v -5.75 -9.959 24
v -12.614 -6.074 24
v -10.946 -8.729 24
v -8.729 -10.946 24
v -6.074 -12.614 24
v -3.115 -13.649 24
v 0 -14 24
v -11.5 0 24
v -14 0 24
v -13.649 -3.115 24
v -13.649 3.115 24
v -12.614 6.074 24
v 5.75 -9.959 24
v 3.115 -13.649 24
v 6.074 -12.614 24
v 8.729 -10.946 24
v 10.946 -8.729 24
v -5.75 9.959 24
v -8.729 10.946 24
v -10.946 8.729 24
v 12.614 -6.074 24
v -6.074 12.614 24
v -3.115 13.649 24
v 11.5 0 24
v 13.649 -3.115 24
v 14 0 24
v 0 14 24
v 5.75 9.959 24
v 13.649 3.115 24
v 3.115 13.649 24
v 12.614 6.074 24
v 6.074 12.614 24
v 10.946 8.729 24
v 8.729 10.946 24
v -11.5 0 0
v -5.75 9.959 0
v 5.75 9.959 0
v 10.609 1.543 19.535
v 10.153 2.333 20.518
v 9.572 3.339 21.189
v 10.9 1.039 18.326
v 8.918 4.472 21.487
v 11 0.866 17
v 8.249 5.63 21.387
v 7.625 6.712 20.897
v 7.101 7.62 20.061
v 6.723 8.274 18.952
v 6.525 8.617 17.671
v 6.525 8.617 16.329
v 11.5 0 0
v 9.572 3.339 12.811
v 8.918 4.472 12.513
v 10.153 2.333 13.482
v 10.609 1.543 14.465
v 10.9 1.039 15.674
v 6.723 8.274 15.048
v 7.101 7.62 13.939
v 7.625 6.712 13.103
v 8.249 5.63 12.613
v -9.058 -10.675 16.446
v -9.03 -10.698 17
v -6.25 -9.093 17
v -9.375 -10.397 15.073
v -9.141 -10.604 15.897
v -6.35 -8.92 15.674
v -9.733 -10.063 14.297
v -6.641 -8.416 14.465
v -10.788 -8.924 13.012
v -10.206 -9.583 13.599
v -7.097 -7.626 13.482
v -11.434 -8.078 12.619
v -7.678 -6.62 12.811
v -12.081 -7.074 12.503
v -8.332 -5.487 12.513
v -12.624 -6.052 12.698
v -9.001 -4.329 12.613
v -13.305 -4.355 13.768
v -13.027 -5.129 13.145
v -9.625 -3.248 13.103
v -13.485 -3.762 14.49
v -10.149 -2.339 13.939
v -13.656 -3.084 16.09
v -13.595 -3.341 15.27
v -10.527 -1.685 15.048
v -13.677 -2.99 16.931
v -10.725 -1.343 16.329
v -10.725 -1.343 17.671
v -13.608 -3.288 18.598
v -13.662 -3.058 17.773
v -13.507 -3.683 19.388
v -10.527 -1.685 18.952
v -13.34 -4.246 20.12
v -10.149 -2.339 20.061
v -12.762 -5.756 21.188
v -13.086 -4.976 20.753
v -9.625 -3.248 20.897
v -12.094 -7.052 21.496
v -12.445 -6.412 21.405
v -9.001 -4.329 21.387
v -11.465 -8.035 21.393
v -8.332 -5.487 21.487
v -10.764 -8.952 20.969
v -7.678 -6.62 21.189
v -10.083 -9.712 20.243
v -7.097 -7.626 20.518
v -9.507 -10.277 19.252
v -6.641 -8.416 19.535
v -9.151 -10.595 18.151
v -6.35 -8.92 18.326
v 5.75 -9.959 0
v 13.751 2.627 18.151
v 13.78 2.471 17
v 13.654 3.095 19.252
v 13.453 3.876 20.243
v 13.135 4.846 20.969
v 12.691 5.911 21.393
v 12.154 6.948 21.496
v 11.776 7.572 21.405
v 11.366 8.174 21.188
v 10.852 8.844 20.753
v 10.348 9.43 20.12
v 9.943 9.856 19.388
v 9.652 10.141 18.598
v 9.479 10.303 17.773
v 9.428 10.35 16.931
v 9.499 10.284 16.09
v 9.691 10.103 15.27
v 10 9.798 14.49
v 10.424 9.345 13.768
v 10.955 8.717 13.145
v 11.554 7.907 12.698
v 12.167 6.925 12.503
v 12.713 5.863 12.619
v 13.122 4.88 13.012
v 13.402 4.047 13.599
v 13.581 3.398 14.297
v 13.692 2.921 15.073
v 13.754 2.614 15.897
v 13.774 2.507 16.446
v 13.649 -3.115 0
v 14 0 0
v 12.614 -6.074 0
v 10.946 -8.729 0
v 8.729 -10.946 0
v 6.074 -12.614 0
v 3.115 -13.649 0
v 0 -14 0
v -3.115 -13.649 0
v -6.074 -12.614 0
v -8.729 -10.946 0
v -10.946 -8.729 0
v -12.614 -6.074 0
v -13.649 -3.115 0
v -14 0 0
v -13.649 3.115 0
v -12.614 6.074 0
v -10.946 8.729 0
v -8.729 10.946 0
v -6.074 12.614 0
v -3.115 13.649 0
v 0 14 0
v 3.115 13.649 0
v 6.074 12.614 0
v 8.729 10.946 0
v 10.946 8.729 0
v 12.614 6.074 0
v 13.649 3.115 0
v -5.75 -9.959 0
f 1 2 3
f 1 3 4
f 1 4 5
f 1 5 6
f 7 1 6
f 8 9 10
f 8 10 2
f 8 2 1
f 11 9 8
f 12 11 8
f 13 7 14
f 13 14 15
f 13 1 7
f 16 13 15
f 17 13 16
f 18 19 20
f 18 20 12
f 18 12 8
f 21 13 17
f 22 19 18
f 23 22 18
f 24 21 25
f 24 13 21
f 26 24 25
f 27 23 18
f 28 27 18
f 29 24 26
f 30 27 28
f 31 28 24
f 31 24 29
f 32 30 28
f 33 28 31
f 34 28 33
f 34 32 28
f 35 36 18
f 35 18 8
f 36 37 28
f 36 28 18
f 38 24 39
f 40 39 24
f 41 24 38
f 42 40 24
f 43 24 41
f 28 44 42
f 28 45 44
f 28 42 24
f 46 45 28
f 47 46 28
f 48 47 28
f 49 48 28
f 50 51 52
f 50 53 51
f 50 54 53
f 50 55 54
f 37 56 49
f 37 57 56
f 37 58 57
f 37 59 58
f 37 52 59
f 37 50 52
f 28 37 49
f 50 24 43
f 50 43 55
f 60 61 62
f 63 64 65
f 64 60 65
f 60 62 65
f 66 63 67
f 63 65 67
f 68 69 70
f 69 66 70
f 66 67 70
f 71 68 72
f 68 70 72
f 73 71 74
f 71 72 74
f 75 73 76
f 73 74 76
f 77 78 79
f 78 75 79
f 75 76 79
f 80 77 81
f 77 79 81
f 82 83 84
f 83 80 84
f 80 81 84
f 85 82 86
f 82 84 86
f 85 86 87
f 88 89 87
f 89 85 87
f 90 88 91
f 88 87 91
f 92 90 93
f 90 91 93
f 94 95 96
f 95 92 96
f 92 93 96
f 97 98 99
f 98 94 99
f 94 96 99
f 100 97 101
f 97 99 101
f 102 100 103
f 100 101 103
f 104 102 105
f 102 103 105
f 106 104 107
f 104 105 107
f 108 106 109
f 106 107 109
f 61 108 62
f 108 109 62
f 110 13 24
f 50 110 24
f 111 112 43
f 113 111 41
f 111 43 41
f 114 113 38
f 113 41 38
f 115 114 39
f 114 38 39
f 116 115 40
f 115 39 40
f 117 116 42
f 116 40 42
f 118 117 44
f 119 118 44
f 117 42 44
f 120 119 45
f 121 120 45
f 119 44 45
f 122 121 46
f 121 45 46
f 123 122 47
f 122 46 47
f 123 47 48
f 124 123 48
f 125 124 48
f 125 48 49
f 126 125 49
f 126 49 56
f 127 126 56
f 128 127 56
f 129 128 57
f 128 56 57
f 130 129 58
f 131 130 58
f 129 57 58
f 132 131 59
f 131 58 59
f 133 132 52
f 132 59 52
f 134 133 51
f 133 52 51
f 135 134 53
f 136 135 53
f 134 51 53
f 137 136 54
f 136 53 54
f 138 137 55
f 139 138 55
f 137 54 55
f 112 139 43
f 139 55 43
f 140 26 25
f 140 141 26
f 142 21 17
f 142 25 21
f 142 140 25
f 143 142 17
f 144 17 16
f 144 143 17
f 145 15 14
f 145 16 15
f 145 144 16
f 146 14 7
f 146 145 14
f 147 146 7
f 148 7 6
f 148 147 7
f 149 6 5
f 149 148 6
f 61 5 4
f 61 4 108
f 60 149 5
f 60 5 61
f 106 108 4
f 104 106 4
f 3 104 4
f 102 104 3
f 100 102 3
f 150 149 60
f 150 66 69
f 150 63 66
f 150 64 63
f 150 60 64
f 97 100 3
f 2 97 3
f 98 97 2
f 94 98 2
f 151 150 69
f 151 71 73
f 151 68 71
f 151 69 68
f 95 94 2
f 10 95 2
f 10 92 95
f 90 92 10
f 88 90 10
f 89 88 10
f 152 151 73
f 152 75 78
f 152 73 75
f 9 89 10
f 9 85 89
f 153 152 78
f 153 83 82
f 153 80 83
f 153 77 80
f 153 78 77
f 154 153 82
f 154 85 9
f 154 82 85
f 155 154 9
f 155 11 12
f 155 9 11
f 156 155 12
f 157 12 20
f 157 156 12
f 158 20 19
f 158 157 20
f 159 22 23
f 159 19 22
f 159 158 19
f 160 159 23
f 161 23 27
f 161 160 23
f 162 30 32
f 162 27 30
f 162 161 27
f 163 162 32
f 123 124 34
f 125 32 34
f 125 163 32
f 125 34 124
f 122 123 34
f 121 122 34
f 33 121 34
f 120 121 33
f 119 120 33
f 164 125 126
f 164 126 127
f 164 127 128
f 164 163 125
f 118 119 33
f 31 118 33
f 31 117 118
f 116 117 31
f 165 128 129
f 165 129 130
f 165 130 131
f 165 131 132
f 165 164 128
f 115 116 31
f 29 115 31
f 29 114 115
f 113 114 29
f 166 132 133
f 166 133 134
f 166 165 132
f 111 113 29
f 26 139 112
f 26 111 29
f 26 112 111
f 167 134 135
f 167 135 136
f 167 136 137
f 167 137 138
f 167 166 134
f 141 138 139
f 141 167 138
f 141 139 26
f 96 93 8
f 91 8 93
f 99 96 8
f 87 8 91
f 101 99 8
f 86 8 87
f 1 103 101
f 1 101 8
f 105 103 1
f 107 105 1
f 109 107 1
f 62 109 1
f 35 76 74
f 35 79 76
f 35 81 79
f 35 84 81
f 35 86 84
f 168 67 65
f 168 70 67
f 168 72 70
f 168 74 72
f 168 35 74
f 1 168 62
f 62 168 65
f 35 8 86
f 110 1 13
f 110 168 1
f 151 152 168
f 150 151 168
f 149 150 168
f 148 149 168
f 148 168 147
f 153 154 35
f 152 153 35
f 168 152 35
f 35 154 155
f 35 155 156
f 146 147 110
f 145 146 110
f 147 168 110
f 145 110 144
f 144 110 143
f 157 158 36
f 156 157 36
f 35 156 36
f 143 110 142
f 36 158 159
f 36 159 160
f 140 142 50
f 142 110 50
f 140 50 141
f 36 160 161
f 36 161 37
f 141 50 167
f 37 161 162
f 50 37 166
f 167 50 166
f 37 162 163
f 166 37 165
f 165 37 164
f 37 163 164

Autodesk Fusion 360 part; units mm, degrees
sketch "Boceto1" plane through (0, 0, 0) normal (0, 0, 1) x (1, 0, 0)
  circle A0 centre (0, 0) radius 11.5
  line L0 (0, 0) -> (11.5, 0)
  line L1 (0, 0) -> (5.75, 9.9593)
  line L2 (0, 0) -> (-5.75, 9.9593)
  line L3 (0, 0) -> (-11.5, 0)
  line L4 (0, 0) -> (-5.75, -9.9593)
  line L5 (0, 0) -> (5.75, -9.9593)
  line L6 (5.75, 9.9593) -> (-5.75, 9.9593)
  line L7 (-5.75, 9.9593) -> (-11.5, 0)
  line L8 (-11.5, 0) -> (-5.75, -9.9593)
  line L9 (-5.75, -9.9593) -> (5.75, -9.9593)
  line L10 (5.75, -9.9593) -> (11.5, 0)
  line L11 (11.5, 0) -> (5.75, 9.9593)
  circle A1 centre (0, 0) radius 14
  dimension "d1" = 23
  dimension "d3" = 360
  dimension "d5" = 360
  dimension "d6" = 28
extrude "Extruir1" add sketch "Boceto1" along normal blind 24 contours A0 L11 | A0 L10 | A0 L6 | A0 L9 | A0 L7 | A0 L8 | A1
sketch "Boceto2" plane through (8.625, 4.9796, 0) normal (-0.866, -0.5, 0) x (0.5, -0.866, 0)
  line L0 (-5.75, 0) -> (5.75, 0)
  line L1 (5.75, 0) -> (5.75, 24)
  line L2 (5.75, 24) -> (-5.75, 24)
  line L3 (-5.75, 24) -> (-5.75, 0)
  circle A0 centre (0.25, 17) radius 4.5
  dimension "d9" = 9
  dimension "d10" = 7
  dimension "d11" = 5.5
extrude "Extruir2" cut sketch "Boceto2" along normal mid plane 54 contours A0
